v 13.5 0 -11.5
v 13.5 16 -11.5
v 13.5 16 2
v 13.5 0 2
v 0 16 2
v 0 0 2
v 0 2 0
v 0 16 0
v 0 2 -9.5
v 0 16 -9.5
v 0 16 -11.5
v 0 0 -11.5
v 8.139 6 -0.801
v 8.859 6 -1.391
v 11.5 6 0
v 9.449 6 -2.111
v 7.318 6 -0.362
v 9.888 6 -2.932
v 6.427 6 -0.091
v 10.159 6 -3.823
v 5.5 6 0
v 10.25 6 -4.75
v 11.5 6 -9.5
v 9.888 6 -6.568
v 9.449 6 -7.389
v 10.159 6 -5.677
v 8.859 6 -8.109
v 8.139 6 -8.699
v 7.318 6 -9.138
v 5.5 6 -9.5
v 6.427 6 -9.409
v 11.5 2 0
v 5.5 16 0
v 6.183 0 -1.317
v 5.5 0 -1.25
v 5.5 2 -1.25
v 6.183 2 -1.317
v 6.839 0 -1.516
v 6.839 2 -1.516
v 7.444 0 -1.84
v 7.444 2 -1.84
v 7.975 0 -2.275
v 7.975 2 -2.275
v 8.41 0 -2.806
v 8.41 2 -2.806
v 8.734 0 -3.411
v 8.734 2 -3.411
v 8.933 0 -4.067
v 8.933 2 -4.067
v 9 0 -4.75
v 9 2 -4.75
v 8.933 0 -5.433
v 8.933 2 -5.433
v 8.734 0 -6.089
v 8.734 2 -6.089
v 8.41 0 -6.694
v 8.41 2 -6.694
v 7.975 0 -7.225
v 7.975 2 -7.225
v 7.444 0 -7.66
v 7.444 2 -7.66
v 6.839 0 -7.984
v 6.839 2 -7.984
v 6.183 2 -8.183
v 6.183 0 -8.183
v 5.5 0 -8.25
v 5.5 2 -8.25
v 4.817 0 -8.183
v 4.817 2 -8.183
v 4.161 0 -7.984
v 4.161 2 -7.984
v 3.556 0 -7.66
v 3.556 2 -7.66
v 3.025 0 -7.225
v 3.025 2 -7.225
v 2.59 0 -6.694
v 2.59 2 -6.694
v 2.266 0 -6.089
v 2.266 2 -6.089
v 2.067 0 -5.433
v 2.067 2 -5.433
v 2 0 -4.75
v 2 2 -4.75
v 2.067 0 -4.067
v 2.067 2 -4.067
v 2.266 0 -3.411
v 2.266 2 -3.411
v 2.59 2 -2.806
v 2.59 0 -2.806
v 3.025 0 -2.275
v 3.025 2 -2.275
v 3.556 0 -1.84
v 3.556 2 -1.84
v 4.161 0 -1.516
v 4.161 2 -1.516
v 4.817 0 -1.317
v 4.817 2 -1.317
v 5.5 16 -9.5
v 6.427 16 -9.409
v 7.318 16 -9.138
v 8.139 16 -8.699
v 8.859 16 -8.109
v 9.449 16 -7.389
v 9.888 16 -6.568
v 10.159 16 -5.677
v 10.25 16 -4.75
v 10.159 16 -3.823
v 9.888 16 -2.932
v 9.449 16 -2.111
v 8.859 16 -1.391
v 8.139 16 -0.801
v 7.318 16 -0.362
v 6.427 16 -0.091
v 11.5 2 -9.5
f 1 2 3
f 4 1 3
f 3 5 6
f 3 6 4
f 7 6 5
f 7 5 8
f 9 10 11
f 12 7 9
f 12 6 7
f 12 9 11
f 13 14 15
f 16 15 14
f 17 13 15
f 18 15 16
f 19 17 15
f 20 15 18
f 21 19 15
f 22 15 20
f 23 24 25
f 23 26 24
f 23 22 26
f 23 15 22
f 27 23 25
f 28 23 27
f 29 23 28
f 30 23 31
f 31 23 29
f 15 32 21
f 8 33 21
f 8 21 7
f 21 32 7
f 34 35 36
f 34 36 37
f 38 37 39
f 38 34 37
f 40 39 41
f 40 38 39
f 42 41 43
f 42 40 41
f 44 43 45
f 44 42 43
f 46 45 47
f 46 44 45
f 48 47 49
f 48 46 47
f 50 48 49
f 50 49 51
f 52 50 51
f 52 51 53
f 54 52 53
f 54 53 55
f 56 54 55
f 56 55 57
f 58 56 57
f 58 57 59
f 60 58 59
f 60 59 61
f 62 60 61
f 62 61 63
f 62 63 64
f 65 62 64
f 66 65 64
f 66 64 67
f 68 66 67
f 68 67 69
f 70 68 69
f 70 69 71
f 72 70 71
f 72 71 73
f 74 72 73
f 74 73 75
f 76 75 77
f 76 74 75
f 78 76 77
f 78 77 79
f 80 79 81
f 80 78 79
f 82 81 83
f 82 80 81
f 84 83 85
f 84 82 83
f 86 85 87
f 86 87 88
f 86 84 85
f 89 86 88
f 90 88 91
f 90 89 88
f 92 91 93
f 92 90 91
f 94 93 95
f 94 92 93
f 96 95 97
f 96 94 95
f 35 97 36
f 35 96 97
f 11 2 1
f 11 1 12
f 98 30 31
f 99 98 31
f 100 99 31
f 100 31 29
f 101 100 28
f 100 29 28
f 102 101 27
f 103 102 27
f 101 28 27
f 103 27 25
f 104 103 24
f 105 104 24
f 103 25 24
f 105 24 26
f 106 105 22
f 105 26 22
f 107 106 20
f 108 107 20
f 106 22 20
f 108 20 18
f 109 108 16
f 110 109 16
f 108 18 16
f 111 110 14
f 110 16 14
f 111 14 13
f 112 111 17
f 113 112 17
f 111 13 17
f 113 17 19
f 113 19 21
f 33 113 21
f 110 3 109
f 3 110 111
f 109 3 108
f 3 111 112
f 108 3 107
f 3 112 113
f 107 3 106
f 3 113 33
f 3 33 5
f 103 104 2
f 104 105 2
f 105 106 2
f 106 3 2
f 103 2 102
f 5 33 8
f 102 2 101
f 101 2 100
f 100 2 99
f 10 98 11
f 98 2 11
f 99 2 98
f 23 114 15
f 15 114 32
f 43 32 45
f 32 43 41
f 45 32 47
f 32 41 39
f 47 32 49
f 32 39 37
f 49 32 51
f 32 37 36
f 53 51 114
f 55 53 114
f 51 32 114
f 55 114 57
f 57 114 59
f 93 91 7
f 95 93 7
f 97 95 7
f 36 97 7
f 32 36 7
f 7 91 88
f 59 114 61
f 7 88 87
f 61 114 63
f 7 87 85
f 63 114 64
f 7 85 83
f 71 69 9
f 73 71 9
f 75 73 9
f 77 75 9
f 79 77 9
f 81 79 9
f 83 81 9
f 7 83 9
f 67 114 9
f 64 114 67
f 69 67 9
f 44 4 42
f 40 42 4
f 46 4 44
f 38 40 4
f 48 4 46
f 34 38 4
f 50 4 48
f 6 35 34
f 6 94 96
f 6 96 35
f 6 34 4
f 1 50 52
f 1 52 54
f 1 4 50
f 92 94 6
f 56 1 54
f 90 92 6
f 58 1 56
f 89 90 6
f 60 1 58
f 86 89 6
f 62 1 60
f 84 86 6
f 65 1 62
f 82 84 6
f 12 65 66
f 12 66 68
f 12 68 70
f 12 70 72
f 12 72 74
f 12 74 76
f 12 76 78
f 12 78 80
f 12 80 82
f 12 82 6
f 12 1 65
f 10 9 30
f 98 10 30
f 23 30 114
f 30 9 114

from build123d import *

# Parameters (mm, degrees)
SKETCH_1_R          = 3.5
EXTRUDE_2_DEPTH     = 16
CUT_EXTRUDE_START   = 2
SKETCH_1_7_W        = 11.5
SKETCH_1_7_H        = 9.5
SKETCH_1_7_R        = 3.5
CUT_EXTRUDE_6_DEPTH = 4
SKETCH_1_9_R        = 3.5
CUT_EXTRUDE_8_DEPTH = 14


with BuildPart() as part:
    # 草图1 → 凸台-拉伸2 (new body)
    # profile 1 of 3: a face of its own
    with BuildSketch(Plane(origin=(0, 0, 0), x_dir=(1, 0, 0), z_dir=(0, 1, 0))):
        Polygon((0, 9.5), (0, 11.5), (5.5, 11.5), (13.5, 11.5), (13.5, -2), (5.5, -2), (0, -2), (0, 0), (5.5, 0), (11.5, 0), (11.5, 9.5), (5.5, 9.5), align=None)
    # profile 2 of 3: a face of its own
    with BuildSketch(Plane(origin=(0, 0, 0), x_dir=(1, 0, 0), z_dir=(0, 1, 0))):
        with BuildLine():
            Line((5.5, 9.5), (11.5, 9.5))
            Line((11.5, 9.5), (11.5, 0))
            Line((11.5, 0), (5.5, 0))
            ThreePointArc((5.5, 0), (10.25, 4.75), (5.5, 9.5))
        make_face()
    # profile 3 of 3: a face of its own
    with BuildSketch(Plane(origin=(0, 0, 0), x_dir=(1, 0, 0), z_dir=(0, 1, 0))):
        with BuildLine():
            ThreePointArc((5.5, 9.5), (10.25, 4.75), (5.5, 0))
            Line((5.5, 0), (0, 0))
            Line((0, 0), (0, 9.5))
            Line((0, 9.5), (5.5, 9.5))
        make_face()
        with Locations((5.5, 4.75)):
            Circle(SKETCH_1_R, mode=Mode.SUBTRACT)
    extrude(amount=EXTRUDE_2_DEPTH)

    # 草图1<7> → 切除-拉伸6 (cut)
    with BuildSketch(Plane(origin=(0, 0, 0), x_dir=(1, 0, 0), z_dir=(0, 1, 0)).offset(CUT_EXTRUDE_START)):
        with Locations((5.75, 4.75)):
            Rectangle(SKETCH_1_7_W, SKETCH_1_7_H)
        with Locations((5.5, 4.75)):
            Circle(SKETCH_1_7_R, mode=Mode.SUBTRACT)
    extrude(amount=CUT_EXTRUDE_6_DEPTH, mode=Mode.SUBTRACT)

    # 草图1<9> → 切除-拉伸8 (cut)
    with BuildSketch(Plane(origin=(0, 0, 0), x_dir=(1, 0, 0), z_dir=(0, 1, 0)).offset(CUT_EXTRUDE_START)):
        with BuildLine():
            Line((0, 9.5), (0, 0))
            Line((0, 0), (5.5, 0))
            ThreePointArc((5.5, 0), (10.25, 4.75), (5.5, 9.5))
            Line((5.5, 9.5), (0, 9.5))
        make_face()
        with Locations((5.5, 4.75)):
            Circle(SKETCH_1_9_R, mode=Mode.SUBTRACT)
    extrude(amount=CUT_EXTRUDE_8_DEPTH, mode=Mode.SUBTRACT)


solid = part.part
